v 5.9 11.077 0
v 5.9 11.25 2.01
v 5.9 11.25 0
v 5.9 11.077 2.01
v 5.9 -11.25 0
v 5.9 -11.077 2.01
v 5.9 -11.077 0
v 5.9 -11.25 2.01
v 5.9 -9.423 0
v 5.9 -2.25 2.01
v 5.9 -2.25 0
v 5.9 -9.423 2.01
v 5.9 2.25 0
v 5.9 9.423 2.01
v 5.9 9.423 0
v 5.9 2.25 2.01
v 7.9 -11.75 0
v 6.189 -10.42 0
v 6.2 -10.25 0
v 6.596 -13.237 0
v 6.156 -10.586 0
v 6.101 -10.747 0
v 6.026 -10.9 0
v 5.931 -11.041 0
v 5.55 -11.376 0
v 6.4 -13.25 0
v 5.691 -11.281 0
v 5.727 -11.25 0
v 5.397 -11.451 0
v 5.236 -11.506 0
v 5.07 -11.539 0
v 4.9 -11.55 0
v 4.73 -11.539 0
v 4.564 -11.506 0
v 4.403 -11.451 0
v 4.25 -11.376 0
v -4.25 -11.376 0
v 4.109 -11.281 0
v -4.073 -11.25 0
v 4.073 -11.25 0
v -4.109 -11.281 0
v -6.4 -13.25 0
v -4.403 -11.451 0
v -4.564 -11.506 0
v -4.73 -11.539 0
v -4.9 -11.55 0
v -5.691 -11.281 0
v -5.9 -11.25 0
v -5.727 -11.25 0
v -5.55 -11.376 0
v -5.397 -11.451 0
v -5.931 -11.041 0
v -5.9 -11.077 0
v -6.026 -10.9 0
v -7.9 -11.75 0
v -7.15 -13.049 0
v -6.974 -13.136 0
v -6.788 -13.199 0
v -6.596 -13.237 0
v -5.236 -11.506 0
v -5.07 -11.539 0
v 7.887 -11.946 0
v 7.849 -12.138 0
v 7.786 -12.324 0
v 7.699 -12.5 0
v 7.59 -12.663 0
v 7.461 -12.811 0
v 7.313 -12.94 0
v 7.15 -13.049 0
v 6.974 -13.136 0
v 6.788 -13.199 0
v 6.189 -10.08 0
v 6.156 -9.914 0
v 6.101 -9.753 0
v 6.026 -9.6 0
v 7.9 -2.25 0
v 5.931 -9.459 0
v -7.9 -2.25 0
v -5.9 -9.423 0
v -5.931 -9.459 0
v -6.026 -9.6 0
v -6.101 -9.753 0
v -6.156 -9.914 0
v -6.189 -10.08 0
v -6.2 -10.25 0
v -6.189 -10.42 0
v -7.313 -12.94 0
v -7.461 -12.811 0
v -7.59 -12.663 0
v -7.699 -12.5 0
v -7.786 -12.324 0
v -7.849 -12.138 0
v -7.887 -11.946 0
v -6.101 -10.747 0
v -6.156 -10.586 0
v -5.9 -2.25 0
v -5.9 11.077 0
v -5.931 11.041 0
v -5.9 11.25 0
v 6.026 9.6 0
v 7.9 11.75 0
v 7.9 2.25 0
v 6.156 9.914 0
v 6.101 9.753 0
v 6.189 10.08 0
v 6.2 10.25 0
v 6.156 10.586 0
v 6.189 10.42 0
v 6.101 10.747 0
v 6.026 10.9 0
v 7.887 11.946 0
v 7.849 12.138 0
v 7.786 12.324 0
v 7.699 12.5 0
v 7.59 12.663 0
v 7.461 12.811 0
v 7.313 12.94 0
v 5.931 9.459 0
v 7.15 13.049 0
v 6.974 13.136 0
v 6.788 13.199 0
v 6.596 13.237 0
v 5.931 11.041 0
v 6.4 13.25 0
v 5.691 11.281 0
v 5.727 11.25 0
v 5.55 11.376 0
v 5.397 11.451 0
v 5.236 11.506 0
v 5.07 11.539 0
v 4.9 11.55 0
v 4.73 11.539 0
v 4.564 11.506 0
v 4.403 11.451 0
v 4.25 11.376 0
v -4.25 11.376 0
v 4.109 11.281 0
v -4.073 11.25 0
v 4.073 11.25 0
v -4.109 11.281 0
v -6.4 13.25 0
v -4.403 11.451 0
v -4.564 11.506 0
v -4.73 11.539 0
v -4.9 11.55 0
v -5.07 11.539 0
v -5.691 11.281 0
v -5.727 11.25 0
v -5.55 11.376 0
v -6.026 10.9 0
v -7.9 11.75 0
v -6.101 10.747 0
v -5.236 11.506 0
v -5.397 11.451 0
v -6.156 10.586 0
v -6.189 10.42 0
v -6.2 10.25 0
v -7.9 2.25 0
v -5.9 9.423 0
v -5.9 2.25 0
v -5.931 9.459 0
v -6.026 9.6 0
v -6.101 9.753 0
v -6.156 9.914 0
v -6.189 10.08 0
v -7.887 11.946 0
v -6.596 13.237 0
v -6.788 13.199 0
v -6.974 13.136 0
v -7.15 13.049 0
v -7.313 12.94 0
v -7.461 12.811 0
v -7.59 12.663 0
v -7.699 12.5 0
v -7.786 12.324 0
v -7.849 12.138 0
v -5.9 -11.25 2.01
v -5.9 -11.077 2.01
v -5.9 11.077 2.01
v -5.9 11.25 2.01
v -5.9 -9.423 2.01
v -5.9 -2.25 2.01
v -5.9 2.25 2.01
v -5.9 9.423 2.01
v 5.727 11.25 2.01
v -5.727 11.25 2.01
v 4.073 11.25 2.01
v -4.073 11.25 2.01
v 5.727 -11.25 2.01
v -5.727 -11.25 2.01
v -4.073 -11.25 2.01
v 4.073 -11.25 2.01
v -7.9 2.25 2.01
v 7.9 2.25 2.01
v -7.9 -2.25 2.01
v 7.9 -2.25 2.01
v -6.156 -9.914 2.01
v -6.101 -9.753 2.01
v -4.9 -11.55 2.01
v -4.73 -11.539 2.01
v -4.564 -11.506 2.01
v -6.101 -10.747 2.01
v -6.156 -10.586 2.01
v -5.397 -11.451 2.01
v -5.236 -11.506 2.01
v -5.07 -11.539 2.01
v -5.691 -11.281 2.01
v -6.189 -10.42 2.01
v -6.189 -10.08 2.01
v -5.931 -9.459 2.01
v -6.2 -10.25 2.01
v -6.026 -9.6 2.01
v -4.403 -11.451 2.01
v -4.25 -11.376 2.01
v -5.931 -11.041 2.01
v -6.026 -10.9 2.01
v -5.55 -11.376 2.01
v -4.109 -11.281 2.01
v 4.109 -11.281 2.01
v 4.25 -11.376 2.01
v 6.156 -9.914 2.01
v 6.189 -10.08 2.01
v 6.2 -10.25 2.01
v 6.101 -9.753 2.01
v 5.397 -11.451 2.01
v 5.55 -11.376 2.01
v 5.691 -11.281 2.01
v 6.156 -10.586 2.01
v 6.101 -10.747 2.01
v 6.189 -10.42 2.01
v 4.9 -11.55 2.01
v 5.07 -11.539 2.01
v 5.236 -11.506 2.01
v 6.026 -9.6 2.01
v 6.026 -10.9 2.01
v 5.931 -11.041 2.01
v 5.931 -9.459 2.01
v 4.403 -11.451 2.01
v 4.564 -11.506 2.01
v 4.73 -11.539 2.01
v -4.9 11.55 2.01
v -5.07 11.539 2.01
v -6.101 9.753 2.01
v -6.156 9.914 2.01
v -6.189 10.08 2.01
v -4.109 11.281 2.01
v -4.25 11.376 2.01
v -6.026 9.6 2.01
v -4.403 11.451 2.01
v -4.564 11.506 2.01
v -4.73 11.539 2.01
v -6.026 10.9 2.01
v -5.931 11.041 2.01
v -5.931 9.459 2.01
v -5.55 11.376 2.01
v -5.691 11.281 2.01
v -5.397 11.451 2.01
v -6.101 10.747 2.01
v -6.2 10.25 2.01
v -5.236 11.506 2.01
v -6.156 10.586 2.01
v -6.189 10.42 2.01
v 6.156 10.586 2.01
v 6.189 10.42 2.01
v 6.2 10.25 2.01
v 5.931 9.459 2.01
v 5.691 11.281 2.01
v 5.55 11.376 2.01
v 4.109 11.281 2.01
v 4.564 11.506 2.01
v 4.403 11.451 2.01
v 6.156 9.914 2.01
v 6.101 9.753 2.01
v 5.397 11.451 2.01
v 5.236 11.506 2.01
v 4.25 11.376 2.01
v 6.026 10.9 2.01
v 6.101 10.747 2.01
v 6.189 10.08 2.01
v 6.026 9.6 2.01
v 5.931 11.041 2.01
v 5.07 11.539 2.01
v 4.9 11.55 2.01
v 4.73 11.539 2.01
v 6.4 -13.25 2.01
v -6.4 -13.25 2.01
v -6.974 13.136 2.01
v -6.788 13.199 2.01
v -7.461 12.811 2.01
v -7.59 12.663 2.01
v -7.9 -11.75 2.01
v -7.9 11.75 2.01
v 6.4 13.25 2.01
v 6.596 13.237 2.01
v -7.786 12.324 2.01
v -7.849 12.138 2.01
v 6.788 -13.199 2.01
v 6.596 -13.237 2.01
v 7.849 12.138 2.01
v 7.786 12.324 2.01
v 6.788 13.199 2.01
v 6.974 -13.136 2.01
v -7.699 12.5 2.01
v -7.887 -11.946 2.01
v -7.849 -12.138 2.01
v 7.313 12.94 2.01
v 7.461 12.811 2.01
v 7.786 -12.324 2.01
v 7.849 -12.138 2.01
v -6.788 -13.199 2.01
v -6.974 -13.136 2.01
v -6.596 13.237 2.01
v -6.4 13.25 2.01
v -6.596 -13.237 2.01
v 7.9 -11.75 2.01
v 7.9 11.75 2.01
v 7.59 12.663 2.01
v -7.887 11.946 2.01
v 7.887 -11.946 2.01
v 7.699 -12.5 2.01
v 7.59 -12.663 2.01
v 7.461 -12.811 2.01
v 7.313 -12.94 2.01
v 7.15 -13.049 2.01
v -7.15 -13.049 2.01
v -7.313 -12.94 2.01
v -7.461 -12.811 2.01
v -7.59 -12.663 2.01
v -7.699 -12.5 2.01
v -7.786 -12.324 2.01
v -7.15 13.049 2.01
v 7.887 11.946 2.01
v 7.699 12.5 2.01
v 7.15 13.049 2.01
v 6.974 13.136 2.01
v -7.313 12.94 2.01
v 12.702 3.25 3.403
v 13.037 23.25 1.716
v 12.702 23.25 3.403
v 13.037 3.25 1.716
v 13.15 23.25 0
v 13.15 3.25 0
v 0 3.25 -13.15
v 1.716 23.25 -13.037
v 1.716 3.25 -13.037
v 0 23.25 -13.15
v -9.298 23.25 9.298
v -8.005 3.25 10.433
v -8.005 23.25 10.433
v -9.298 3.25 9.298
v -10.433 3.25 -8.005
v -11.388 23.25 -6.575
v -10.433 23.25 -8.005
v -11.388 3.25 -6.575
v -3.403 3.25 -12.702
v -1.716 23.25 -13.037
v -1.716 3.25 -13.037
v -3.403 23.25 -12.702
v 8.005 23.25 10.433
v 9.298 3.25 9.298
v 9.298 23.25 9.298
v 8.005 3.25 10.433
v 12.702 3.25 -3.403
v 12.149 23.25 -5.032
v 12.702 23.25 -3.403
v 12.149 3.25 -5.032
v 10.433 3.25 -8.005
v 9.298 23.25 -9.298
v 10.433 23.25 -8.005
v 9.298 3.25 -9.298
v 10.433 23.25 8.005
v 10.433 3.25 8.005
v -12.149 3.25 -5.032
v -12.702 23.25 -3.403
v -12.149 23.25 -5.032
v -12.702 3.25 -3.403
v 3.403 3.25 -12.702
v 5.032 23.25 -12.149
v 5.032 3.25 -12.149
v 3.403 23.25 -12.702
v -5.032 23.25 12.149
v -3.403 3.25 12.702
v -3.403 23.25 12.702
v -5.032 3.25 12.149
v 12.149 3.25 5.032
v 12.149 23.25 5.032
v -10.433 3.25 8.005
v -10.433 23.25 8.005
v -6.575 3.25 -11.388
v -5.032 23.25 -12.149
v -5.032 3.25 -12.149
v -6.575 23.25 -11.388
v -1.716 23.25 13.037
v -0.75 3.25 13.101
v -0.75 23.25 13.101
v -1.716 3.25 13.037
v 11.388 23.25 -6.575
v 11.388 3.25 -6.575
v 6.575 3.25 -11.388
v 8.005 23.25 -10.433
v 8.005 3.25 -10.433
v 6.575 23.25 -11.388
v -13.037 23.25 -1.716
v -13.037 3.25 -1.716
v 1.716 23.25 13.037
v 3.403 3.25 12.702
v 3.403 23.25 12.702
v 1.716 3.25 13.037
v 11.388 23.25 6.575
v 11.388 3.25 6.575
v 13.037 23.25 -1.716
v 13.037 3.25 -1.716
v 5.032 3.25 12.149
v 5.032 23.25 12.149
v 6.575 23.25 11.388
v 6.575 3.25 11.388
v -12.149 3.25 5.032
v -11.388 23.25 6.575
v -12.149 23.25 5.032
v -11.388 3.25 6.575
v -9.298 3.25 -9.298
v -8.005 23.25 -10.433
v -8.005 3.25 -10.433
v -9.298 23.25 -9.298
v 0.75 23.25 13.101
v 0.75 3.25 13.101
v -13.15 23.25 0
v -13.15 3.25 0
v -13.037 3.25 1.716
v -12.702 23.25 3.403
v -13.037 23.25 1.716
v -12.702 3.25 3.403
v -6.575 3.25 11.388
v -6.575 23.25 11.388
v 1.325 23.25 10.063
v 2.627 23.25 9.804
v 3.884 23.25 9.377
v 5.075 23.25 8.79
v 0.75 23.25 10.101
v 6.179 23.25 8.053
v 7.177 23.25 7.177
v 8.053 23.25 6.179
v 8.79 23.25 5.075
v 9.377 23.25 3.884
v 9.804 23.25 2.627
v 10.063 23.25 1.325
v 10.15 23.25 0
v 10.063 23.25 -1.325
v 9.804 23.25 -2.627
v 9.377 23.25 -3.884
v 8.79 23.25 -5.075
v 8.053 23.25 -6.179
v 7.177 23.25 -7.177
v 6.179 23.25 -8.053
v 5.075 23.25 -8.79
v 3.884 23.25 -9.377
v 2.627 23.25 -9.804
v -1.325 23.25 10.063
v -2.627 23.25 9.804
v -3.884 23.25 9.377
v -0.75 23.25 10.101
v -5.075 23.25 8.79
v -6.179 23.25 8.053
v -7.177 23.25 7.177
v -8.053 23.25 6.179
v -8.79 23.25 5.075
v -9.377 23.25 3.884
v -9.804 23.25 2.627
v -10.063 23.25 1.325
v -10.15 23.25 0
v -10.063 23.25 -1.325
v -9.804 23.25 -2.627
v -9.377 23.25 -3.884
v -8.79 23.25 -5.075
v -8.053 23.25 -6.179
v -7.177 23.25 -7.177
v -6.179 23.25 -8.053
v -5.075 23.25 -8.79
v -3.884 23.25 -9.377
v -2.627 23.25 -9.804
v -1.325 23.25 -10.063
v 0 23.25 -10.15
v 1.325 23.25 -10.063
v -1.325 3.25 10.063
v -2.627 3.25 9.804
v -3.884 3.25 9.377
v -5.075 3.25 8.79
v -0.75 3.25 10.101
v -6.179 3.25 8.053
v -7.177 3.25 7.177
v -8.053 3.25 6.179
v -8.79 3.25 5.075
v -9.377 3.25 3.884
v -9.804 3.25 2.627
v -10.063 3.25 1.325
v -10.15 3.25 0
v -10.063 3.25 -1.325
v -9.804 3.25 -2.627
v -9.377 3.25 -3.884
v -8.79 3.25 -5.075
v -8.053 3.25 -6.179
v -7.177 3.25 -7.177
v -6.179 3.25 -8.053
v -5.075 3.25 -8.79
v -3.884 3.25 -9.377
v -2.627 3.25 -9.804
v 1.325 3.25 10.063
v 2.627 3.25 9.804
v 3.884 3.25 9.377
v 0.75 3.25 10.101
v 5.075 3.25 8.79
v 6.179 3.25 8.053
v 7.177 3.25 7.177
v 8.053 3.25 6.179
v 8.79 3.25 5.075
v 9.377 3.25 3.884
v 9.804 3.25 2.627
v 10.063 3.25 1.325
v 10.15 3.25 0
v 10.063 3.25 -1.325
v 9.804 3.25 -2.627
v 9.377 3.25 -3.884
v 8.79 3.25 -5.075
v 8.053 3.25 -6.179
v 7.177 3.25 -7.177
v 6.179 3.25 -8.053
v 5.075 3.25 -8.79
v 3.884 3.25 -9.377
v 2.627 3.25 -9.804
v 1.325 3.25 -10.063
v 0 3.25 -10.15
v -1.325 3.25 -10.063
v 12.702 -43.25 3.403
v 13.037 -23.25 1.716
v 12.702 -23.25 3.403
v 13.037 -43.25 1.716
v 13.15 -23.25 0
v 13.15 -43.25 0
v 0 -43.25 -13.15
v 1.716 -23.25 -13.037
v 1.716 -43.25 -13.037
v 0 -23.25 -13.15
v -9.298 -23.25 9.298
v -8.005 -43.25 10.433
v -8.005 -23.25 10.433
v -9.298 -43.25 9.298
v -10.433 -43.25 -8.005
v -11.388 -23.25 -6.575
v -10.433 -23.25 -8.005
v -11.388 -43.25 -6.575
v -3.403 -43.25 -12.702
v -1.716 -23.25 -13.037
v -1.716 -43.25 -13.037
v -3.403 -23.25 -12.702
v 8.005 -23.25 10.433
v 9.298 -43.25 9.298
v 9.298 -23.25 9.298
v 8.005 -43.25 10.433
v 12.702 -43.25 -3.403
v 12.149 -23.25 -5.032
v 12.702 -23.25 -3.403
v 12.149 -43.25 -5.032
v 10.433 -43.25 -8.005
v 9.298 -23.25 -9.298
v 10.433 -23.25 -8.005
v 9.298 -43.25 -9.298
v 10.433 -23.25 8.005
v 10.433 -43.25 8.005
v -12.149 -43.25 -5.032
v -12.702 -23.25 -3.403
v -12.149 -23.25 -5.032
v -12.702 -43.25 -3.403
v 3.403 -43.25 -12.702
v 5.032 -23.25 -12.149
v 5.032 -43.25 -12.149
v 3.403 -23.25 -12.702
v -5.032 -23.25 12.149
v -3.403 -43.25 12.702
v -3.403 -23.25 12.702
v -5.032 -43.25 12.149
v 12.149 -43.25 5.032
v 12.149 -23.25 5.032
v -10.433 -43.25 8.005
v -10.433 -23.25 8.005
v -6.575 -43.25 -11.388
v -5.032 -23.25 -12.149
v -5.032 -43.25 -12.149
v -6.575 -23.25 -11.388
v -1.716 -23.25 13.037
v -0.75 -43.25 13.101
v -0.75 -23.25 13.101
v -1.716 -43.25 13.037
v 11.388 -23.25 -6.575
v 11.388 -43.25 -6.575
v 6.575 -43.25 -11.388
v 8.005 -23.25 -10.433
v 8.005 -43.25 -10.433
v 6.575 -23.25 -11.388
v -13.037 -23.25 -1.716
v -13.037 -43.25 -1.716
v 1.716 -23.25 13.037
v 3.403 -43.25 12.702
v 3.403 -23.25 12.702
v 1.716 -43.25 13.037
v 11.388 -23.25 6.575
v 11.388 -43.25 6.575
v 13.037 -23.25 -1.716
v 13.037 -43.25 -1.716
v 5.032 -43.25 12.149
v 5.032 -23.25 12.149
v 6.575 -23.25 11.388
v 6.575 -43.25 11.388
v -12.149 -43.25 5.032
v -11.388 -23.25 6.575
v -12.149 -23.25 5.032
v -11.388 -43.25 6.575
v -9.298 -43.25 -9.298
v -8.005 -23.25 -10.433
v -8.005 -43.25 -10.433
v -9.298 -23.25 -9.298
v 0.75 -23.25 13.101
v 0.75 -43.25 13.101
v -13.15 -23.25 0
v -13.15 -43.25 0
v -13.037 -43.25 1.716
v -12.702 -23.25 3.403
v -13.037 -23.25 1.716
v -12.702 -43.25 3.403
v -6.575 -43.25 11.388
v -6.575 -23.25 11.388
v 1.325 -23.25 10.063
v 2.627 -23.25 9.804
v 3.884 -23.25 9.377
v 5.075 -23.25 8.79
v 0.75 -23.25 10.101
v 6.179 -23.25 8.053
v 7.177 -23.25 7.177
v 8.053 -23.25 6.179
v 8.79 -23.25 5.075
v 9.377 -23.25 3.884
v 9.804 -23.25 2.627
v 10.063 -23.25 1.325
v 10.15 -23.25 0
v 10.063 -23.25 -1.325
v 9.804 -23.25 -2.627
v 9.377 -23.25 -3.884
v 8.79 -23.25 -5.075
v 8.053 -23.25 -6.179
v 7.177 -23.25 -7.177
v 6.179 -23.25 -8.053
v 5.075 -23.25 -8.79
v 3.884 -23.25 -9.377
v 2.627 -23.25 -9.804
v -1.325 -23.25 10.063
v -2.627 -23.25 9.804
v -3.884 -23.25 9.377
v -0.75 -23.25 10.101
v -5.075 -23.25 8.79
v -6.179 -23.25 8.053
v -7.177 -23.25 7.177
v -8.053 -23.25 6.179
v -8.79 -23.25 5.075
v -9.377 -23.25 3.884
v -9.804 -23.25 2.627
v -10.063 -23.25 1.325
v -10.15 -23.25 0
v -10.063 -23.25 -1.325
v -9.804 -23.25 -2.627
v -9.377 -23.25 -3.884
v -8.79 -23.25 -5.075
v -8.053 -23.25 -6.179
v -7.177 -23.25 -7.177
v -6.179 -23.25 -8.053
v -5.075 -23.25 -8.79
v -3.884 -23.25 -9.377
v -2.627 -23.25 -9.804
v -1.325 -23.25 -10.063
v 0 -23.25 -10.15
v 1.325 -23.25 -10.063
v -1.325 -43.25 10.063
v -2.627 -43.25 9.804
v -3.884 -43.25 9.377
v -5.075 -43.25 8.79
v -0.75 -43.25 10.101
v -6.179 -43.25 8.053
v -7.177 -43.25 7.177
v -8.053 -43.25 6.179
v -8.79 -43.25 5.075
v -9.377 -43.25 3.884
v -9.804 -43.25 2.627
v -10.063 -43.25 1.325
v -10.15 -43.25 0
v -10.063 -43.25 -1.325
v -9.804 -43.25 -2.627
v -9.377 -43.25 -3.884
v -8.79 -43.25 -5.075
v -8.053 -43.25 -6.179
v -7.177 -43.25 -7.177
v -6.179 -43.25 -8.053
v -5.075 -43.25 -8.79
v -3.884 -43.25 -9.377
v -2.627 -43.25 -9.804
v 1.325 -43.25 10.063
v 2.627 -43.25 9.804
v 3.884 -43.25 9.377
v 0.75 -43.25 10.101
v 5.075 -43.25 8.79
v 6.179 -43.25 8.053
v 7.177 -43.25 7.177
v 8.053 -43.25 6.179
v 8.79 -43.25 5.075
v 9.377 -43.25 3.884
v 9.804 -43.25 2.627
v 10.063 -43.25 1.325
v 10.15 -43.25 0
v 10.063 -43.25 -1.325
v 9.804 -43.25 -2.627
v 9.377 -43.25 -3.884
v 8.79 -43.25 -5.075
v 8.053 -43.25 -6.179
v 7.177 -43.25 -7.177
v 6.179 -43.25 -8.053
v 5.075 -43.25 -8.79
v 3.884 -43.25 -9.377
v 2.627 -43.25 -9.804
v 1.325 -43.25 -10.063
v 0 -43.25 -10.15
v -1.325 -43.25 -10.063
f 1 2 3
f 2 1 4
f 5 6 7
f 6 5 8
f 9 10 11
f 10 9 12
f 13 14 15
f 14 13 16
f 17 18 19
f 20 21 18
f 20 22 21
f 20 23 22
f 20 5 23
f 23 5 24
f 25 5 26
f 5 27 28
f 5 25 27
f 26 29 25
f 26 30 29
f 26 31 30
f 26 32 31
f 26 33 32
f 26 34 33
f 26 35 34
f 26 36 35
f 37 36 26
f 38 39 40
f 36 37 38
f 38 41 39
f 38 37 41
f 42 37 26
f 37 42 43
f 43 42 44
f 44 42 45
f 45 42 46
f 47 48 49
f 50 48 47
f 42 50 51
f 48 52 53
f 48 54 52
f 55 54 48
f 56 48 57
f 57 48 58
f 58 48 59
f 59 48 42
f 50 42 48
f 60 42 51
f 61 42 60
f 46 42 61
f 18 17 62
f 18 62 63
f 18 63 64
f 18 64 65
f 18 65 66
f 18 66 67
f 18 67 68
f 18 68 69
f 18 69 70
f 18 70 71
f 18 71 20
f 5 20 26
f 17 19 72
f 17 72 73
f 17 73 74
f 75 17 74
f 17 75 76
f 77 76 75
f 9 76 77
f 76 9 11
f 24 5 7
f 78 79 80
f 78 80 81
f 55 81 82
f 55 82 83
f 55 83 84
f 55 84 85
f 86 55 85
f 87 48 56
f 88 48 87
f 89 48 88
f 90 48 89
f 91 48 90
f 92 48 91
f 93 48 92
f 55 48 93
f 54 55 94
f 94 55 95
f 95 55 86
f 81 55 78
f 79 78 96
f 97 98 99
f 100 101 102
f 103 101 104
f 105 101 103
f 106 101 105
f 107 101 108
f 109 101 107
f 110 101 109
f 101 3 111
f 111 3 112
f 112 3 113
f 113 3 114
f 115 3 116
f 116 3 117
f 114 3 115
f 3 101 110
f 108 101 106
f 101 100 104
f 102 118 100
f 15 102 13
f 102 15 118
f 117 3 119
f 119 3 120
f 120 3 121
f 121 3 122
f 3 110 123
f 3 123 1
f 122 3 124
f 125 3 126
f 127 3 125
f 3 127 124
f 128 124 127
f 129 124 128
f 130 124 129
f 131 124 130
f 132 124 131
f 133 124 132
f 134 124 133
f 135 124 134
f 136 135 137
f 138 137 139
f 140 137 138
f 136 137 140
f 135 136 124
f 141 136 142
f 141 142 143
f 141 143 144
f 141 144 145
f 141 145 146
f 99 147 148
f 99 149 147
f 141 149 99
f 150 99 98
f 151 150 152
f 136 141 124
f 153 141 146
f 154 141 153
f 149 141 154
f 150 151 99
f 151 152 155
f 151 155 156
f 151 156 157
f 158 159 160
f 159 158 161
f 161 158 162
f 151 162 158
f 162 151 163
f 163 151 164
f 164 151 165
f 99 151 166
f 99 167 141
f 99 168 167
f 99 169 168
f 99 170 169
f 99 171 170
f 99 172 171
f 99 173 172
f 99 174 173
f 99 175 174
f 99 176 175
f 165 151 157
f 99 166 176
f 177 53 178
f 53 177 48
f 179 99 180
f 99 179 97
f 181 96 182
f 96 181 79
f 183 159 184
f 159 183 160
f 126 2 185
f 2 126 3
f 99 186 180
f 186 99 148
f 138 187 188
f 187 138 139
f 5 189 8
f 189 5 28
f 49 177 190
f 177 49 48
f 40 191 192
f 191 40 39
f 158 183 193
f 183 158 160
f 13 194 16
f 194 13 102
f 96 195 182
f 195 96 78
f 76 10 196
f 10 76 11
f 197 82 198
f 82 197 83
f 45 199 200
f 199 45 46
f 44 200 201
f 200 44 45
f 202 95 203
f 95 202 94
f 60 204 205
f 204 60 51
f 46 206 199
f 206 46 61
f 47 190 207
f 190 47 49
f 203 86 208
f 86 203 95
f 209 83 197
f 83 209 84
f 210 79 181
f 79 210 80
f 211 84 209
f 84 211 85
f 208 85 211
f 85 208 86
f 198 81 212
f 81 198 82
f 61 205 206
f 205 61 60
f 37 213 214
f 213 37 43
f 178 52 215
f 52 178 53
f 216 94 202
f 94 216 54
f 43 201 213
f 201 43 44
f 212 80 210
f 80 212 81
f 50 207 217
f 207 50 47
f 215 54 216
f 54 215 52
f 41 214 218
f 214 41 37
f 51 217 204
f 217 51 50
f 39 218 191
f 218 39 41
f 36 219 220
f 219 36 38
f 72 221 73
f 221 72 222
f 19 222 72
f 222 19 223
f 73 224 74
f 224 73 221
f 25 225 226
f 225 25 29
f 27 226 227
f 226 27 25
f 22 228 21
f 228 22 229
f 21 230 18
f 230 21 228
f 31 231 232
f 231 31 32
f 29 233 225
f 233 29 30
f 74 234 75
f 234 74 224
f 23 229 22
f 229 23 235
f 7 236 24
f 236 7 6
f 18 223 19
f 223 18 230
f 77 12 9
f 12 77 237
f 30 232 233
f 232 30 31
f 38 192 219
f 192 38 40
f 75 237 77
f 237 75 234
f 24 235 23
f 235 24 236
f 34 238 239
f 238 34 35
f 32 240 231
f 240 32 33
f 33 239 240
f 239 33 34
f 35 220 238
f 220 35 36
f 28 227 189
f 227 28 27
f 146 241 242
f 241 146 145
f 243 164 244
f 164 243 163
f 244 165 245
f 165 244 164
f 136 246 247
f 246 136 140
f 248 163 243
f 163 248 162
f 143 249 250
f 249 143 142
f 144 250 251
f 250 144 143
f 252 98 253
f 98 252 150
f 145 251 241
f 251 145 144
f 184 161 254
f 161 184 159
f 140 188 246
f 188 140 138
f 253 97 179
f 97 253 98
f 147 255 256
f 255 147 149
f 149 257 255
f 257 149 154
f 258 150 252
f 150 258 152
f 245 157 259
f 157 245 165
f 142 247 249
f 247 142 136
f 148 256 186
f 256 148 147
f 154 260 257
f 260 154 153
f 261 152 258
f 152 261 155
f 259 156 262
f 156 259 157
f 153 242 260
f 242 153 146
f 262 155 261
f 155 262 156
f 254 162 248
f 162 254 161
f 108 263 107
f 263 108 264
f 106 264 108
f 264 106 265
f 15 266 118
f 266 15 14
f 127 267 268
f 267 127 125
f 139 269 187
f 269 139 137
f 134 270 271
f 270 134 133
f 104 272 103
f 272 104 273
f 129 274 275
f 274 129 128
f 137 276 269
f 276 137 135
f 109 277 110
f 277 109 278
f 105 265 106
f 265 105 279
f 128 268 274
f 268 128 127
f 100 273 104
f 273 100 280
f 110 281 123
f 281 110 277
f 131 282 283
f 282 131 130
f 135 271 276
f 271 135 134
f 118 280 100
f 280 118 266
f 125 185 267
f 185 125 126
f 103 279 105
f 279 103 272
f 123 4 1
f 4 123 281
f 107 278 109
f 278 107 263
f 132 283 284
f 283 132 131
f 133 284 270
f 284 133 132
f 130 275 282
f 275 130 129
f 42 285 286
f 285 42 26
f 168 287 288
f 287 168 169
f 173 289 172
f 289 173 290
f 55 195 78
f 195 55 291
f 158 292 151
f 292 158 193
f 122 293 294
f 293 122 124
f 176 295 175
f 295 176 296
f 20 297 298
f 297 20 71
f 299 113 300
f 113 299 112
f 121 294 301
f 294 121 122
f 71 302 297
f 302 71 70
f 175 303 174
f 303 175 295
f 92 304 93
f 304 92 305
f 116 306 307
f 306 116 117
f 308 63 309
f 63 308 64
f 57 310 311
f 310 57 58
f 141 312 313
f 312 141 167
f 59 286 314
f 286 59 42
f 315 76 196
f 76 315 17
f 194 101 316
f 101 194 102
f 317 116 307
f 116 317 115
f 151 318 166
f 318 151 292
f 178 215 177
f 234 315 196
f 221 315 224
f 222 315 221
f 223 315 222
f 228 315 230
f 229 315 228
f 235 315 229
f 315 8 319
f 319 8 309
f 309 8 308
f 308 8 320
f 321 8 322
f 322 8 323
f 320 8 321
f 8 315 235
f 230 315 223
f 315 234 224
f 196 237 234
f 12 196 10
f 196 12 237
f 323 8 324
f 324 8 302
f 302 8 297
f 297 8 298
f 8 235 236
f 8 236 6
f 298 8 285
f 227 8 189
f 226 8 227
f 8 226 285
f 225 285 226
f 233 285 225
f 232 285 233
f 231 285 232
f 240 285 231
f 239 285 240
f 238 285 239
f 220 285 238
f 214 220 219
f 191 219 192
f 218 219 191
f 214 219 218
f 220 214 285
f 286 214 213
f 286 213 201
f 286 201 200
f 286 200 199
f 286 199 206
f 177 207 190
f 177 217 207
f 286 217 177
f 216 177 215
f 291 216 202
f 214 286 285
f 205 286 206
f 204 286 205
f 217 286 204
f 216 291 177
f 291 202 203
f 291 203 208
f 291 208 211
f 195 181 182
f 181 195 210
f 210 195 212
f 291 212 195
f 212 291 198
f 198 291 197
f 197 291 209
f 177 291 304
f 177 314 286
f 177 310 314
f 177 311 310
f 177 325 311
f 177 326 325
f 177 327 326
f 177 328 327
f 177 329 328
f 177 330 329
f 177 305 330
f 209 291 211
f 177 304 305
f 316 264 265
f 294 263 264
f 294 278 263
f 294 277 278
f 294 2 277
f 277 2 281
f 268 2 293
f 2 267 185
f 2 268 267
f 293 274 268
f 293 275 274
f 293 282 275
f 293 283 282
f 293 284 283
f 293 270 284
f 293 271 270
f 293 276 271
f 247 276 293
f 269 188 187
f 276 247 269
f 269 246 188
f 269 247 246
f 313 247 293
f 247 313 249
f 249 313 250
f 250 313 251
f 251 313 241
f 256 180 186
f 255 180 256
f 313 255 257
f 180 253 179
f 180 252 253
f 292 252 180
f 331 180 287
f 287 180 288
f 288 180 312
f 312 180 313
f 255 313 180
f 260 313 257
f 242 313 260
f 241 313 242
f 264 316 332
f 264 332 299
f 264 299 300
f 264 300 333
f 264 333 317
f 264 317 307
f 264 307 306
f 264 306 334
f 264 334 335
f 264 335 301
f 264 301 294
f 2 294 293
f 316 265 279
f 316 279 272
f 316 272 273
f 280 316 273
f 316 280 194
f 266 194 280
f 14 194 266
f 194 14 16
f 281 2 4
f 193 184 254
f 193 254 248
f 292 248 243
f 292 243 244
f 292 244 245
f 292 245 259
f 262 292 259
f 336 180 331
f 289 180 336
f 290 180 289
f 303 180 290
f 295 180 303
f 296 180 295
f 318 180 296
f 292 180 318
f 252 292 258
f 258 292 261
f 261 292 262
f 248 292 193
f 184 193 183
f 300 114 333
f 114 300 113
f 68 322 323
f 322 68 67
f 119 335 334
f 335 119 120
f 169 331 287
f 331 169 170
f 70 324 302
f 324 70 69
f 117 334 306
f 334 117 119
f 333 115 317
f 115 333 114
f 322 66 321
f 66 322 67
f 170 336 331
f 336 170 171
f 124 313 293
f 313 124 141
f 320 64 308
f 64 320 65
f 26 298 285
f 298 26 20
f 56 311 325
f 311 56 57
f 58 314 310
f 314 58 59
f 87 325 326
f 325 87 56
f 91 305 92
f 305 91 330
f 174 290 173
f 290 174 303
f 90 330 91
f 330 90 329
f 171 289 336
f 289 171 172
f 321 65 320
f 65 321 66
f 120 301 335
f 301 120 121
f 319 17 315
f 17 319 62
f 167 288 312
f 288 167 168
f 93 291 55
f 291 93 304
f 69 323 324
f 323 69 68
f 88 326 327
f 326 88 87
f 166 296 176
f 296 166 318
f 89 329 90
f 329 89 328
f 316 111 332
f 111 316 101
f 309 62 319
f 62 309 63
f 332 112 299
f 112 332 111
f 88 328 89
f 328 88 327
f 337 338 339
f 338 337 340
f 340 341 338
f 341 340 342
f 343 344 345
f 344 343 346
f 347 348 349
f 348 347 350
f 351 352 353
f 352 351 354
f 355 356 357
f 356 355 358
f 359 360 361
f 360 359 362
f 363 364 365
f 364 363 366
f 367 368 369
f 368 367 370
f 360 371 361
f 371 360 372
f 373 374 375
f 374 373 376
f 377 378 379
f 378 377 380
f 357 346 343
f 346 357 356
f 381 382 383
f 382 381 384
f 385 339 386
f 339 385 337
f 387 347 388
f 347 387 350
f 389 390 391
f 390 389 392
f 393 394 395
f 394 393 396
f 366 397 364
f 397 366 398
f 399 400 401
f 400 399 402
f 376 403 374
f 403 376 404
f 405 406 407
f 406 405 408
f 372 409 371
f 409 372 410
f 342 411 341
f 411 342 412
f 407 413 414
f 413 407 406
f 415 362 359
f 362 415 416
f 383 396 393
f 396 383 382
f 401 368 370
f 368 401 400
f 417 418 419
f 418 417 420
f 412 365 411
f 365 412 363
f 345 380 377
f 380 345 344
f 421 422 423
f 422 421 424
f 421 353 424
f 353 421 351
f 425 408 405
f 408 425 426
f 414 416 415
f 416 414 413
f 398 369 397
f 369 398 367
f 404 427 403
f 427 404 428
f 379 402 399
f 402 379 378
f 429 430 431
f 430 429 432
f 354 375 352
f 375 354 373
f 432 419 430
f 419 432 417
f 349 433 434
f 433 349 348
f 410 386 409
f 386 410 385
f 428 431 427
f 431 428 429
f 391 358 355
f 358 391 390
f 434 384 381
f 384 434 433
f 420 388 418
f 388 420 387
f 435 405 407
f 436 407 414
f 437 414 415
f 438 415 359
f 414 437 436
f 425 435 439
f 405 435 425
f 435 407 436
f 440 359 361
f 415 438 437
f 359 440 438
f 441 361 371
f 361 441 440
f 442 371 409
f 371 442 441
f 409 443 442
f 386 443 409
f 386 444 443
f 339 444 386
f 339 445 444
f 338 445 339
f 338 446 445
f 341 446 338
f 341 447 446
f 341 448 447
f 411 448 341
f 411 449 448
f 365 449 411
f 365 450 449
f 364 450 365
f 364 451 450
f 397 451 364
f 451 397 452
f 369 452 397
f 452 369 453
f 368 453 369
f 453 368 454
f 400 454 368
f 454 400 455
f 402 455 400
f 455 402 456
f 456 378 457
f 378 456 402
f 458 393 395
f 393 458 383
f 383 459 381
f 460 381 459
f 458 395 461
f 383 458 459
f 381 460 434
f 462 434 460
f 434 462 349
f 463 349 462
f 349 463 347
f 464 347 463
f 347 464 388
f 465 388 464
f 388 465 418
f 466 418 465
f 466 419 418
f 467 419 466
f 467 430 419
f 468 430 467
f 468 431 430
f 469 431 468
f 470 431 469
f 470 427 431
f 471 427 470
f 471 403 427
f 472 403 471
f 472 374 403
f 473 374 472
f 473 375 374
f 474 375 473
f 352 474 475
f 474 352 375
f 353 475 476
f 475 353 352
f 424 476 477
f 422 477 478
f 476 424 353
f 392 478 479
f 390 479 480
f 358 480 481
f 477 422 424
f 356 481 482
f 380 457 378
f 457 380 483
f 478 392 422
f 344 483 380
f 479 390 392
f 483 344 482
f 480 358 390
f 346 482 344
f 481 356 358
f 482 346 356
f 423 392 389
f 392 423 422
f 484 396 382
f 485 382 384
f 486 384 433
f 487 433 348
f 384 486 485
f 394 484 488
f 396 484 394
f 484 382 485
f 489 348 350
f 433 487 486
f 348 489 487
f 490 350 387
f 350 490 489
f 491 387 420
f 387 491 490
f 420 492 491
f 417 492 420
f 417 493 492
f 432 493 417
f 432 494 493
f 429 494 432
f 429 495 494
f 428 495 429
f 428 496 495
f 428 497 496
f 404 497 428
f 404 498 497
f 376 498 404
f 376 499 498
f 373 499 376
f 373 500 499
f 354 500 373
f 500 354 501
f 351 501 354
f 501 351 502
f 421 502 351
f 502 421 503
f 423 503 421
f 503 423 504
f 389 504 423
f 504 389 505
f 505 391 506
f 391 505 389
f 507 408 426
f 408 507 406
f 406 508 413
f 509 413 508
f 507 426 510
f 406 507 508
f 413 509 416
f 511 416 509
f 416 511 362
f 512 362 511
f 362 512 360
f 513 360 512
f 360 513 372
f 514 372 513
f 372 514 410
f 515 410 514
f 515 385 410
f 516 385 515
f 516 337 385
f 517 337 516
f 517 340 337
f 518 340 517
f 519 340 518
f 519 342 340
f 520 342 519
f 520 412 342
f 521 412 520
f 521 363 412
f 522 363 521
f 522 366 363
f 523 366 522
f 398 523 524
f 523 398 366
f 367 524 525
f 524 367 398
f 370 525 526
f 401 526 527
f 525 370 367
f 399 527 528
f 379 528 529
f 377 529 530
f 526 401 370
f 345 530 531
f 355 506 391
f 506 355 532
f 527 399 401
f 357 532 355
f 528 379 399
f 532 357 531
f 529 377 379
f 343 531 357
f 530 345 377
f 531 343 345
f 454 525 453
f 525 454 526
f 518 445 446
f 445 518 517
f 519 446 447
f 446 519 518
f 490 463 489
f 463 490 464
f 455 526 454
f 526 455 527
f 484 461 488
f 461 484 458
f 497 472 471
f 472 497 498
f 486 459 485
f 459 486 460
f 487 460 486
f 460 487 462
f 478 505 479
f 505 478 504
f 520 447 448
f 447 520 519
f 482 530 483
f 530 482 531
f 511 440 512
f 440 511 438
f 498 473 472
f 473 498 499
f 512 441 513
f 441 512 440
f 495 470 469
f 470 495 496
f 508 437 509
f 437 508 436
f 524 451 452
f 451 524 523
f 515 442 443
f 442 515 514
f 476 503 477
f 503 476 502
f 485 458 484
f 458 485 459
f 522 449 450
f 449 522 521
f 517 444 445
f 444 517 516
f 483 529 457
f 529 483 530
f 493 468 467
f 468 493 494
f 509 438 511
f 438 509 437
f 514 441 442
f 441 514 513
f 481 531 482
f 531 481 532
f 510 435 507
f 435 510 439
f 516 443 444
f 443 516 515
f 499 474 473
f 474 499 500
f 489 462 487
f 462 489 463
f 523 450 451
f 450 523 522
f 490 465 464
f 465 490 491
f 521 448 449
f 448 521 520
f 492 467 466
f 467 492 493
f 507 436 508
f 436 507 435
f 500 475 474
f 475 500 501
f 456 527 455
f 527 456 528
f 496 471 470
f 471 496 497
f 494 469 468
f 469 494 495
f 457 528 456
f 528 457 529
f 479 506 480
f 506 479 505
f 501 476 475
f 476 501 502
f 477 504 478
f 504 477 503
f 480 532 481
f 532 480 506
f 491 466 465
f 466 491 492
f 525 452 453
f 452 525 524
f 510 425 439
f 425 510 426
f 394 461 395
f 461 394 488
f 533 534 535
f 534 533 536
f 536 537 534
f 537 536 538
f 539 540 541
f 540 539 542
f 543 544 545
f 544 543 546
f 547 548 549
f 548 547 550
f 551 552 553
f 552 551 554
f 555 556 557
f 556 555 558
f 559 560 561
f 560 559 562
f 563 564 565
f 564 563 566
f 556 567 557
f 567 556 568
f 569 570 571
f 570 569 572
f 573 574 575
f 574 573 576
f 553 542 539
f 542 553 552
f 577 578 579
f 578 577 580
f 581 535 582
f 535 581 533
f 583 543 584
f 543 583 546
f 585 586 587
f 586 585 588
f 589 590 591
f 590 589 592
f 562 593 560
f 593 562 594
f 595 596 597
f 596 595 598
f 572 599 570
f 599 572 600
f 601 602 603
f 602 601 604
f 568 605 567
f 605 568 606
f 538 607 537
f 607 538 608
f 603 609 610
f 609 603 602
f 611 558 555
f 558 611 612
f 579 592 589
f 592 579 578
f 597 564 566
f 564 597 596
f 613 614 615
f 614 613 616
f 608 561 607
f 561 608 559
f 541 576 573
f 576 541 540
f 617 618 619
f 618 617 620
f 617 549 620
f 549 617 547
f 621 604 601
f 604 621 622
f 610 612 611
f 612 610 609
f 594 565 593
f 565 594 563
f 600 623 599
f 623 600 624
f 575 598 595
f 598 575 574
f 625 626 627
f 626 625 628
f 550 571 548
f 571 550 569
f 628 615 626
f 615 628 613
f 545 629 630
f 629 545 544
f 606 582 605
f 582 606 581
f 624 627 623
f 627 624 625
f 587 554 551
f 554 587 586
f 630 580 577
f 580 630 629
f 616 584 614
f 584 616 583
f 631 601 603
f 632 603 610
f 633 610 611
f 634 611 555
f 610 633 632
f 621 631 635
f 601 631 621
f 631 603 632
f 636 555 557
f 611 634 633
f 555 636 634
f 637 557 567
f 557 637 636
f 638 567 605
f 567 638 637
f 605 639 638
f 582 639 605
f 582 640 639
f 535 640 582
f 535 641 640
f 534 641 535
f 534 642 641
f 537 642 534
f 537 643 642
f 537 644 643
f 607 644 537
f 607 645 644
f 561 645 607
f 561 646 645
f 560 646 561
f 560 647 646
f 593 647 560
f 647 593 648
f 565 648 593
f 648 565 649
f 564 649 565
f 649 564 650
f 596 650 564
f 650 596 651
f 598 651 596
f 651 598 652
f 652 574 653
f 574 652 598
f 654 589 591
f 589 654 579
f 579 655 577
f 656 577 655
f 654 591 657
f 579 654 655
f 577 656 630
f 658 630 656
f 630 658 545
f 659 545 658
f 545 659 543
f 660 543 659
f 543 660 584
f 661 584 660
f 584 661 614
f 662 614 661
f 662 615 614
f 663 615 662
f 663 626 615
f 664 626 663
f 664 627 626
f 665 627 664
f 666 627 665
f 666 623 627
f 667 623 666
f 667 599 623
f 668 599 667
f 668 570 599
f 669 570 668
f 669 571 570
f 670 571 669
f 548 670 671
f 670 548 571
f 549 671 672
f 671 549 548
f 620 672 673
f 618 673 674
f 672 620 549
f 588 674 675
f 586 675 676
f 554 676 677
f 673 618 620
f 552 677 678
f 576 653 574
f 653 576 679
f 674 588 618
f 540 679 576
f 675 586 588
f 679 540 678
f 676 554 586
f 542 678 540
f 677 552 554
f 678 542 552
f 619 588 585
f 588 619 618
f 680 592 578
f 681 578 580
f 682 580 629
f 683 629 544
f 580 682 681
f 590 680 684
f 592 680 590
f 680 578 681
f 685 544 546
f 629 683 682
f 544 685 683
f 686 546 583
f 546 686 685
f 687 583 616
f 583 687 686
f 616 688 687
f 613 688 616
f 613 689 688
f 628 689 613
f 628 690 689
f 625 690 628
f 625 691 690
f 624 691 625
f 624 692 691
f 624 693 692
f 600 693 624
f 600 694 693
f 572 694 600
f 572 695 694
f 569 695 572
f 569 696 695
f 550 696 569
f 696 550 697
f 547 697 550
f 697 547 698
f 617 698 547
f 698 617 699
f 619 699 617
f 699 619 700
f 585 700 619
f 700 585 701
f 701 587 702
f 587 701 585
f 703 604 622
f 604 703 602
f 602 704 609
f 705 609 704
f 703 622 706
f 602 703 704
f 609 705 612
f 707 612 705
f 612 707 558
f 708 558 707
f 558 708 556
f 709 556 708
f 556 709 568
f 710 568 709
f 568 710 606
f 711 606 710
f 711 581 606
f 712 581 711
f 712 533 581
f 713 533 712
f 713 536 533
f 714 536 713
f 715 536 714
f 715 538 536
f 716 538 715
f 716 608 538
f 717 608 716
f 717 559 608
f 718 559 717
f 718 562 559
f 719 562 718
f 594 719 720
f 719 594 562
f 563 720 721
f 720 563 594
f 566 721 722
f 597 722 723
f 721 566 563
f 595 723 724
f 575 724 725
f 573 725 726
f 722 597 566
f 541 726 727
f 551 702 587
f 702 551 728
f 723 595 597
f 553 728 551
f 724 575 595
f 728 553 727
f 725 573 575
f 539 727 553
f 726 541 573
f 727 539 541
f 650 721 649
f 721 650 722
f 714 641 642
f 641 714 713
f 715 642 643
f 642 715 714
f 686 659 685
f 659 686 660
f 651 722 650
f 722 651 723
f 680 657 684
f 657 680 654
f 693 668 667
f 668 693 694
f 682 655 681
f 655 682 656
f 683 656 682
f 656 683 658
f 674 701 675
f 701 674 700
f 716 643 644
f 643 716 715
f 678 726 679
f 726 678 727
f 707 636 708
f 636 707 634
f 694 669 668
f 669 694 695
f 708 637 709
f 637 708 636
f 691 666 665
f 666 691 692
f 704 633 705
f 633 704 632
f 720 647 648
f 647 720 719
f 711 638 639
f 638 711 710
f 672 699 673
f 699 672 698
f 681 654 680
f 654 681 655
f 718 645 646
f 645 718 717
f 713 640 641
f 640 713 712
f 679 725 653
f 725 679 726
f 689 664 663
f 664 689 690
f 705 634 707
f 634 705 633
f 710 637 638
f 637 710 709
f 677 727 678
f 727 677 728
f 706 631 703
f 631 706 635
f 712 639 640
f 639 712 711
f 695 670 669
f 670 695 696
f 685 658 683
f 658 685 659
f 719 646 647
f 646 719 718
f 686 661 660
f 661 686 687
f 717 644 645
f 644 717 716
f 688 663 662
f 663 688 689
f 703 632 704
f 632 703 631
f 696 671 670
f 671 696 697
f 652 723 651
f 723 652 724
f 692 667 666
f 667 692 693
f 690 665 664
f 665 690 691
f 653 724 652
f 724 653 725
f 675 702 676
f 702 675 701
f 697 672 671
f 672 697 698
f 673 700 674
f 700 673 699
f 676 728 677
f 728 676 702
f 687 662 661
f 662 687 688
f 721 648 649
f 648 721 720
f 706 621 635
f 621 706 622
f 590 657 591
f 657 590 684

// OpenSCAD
// ============================================================
// Elbow Joint Bracket — MG90S servo between upper arm & forearm
// ============================================================
// Connects two 20 mm PVC pipes (upper arm & forearm) via an
// MG90S micro servo.  One pipe is fixed (upper arm); the other
// (forearm) pivots on the servo output shaft.
//
// Print orientation: flat face down.
// Material: PLA, 80 % infill.
// ============================================================

// MG90S dimensions
srv_w  = 11.8;
srv_l  = 22.5;
srv_h  = 22.7;
tab_l  = 32.0;
tab_h  =  2.5;
tab_ew =  4.5;  // ear width

// PVC collars
pvc_od   = 20;
pvc_tol  =  0.3;
collar_h = 20;
collar_w =  3;

wall     = 2.0;
screw_d  = 2.6;  // M2.5 clearance
corner_r = 1.5;
$fn = 48;

pvc_r    = (pvc_od + pvc_tol) / 2;
collar_r = pvc_r + collar_w;
outer_w  = srv_w + 2*wall;
outer_l  = srv_l + 2*wall;

// ============================================================
module servo_pocket() {
    translate([-srv_w/2, -srv_l/2, 0])
        cube([srv_w, srv_l, srv_h + 2]);
    // Tab
    translate([-tab_l/2, -tab_ew/2, 0])
        cube([tab_l, tab_ew, tab_h + 0.5]);
    // Shaft clearance
    translate([0, -srv_l/2 + 7, -0.1])
        cylinder(r = 5.5, h = wall + 0.2);
}

module body_block() {
    difference() {
        // Outer rounded block
        minkowski() {
            cube([outer_w - 2*corner_r,
                  outer_l - 2*corner_r,
                  wall], center = true);
            cylinder(r = corner_r, h = 0.01);
        }
        // Servo pocket from above
        translate([0, 0, -wall/2])
            servo_pocket();
        // M2.5 mounting screws
        for (s = [[-outer_w/2 + 3, -outer_l/2 + 3],
                  [ outer_w/2 - 3, -outer_l/2 + 3],
                  [-outer_w/2 + 3,  outer_l/2 - 3],
                  [ outer_w/2 - 3,  outer_l/2 - 3]]) {
            translate([s[0], s[1], -wall/2 - 0.1])
                cylinder(r = screw_d/2, h = wall + 0.2);
        }
    }
}

module fixed_collar() {
    // Upper-arm collar (servo body side)
    translate([0, outer_l/2 + collar_h/2, 0])
        rotate([90, 0, 0])
            difference() {
                cylinder(r = collar_r, h = collar_h);
                cylinder(r = pvc_r, h = collar_h + 1);
                // Clamp slot
                translate([-0.75, collar_r - collar_w - 0.5, -0.1])
                    cube([1.5, collar_w + 1, collar_h + 0.2]);
            }
}

module pivot_collar() {
    // Forearm collar (output shaft side) — rotates with servo horn
    translate([0, -outer_l/2 - collar_h/2, 0])
        rotate([90, 0, 0])
            difference() {
                cylinder(r = collar_r, h = collar_h);
                cylinder(r = pvc_r, h = collar_h + 1);
                translate([-0.75, collar_r - collar_w - 0.5, -0.1])
                    cube([1.5, collar_w + 1, collar_h + 0.2]);
            }
}

// ============================================================
union() {
    color("Silver") translate([0, 0, wall/2]) body_block();
    color("DimGray") fixed_collar();
    color("Gray")    pivot_collar();
}
